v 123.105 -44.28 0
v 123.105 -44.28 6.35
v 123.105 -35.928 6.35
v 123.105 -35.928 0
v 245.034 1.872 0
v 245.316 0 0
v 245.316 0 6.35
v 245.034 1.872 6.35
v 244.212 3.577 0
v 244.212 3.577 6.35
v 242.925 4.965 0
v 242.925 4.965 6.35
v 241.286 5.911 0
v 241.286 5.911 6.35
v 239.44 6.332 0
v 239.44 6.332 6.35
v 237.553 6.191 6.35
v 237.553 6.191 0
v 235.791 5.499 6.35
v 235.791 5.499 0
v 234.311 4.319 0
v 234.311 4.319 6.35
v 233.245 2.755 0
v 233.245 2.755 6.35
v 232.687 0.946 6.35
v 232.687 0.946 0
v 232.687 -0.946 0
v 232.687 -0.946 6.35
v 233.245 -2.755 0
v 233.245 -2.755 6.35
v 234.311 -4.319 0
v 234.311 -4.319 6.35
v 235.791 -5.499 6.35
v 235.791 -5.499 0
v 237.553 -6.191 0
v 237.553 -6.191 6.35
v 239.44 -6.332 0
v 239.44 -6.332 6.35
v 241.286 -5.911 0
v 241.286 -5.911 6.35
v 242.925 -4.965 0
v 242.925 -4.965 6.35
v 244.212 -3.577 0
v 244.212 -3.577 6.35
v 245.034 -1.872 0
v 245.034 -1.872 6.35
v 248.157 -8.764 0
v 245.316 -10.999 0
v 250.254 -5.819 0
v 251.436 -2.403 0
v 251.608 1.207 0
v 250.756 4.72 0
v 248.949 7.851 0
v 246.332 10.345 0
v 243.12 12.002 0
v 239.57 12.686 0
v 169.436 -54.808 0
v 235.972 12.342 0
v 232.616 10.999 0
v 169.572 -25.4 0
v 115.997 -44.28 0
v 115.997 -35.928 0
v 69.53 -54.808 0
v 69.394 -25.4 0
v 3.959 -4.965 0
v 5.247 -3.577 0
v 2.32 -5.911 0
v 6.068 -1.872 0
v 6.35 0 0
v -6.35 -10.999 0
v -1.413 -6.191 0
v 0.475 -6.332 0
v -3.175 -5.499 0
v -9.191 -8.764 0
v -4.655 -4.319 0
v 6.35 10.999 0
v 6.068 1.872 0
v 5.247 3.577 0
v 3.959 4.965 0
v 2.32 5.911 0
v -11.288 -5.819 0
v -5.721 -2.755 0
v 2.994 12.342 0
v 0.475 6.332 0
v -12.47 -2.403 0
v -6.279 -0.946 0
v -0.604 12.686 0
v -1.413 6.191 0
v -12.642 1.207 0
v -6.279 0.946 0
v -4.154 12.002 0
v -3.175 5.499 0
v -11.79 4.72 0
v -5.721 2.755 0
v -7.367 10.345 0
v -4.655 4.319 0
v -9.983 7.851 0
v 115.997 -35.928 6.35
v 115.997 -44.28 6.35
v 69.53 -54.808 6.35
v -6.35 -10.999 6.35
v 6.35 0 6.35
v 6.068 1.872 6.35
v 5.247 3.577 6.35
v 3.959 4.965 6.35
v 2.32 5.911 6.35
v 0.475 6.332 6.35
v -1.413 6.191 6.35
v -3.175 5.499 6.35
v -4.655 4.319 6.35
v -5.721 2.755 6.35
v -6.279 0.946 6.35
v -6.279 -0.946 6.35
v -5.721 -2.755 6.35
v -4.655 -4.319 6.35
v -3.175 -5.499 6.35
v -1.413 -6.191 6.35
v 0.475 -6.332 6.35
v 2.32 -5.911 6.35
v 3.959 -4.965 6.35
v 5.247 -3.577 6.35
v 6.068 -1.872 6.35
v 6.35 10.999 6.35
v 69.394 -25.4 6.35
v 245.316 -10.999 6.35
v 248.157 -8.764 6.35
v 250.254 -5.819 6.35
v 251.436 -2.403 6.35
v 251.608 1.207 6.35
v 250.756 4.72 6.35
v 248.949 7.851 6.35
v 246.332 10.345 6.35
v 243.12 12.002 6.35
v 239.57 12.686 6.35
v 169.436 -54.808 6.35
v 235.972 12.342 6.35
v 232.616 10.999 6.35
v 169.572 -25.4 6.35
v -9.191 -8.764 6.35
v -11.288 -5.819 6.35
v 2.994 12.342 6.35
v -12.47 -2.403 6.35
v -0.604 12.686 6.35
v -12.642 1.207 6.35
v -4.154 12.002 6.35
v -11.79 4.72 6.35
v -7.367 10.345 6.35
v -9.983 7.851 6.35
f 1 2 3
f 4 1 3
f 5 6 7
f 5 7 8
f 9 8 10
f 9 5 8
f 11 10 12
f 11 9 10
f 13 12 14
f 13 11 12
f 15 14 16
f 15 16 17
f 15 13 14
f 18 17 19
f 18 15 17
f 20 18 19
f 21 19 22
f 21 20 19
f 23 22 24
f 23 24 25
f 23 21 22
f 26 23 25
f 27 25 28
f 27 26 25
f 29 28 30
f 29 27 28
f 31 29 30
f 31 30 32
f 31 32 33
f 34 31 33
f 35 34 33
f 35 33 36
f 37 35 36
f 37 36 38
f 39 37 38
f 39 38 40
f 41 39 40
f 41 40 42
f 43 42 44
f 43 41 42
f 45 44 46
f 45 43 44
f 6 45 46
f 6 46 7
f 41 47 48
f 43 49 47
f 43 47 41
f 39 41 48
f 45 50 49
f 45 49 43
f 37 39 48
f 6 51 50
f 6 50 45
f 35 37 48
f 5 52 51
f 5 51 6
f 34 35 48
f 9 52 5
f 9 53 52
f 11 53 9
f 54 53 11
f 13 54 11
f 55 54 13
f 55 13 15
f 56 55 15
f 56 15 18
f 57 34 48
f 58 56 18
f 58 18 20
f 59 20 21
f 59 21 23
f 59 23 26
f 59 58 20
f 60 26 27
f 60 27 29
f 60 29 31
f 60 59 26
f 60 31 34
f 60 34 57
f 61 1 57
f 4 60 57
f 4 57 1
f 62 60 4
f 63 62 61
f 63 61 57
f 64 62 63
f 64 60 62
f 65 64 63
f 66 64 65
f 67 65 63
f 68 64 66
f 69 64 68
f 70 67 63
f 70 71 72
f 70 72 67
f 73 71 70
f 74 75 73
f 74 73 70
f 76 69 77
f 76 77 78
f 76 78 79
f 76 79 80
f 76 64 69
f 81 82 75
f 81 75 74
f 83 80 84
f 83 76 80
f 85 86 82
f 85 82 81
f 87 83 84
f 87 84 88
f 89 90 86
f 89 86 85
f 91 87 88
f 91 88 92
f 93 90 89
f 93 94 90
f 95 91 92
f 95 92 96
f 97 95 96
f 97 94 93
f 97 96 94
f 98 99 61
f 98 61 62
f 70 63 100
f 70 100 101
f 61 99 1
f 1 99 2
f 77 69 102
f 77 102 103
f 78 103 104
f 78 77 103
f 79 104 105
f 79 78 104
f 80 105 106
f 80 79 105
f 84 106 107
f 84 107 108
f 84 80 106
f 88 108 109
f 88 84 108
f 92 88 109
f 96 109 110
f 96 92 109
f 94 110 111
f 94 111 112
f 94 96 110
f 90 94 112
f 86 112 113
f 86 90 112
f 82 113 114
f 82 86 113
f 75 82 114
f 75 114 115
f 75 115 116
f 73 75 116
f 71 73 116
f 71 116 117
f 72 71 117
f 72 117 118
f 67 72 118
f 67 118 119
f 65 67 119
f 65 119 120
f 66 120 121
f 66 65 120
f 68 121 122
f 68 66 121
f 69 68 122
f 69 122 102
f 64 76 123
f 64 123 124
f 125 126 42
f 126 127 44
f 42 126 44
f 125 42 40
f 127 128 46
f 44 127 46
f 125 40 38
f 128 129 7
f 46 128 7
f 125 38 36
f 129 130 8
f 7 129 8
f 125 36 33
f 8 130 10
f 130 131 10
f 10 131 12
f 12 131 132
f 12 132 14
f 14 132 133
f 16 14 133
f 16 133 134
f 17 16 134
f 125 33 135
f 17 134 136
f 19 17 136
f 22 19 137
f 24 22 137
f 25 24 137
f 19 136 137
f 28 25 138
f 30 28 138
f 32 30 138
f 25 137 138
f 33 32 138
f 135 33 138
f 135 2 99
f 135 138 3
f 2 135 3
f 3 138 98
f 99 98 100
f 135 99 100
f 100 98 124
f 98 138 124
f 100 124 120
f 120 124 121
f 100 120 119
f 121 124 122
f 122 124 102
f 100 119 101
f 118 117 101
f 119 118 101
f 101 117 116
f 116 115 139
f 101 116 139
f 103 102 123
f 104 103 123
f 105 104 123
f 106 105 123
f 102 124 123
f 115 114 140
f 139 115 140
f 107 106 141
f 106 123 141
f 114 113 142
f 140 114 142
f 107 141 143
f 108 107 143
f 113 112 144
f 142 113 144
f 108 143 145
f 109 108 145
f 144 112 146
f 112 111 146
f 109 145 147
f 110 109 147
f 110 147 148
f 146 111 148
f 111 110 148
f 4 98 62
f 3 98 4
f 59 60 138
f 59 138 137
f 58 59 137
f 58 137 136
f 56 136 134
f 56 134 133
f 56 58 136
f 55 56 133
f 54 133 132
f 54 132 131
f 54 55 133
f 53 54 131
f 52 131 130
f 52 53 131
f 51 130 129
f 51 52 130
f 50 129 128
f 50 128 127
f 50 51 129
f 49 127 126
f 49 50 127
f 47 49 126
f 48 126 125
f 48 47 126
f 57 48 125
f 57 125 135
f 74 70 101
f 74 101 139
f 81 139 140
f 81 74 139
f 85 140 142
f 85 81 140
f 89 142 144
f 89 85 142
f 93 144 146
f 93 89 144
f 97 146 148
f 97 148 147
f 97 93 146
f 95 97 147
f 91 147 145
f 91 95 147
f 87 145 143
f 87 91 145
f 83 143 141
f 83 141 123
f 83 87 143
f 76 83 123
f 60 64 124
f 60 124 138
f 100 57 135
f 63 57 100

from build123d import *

# Parameters (mm, degrees)
SKETCH1_R           = 6.35
BOSS_EXTRUDE1_DEPTH = 6.35
CUT_EXTRUDE1_REACH  = 259.643
SKETCH2_W           = 7.108529786
SKETCH2_H           = 8.352611846


with BuildPart() as part:
    # Sketch1 → Boss-Extrude1 (new body)
    with BuildSketch(Plane.XY):
        with BuildLine():
            Line((6.35, 10.998522628), (69.394090512, -25.4))
            Line((69.394090512, -25.4), (169.571649488, -25.4))
            Line((169.571649488, -25.4), (232.61574, 10.998522628))
            ThreePointArc((232.61574, 10.998522628), (249.964262628, 6.35), (245.31574, -10.998522628))
            Line((245.31574, -10.998522628), (169.435593158, -54.807945834))
            Line((169.435593158, -54.807945834), (69.530146842, -54.807945834))
            Line((69.530146842, -54.807945834), (-6.35, -10.998522628))
            ThreePointArc((-6.35, -10.998522628), (-10.998522628, 6.35), (6.35, 10.998522628))
        make_face()
        Circle(SKETCH1_R, mode=Mode.SUBTRACT)
        with Locations((238.96574, 0)):
            Circle(SKETCH1_R, mode=Mode.SUBTRACT)
    extrude(amount=BOSS_EXTRUDE1_DEPTH)

    # Sketch2 → Cut-Extrude1 (cut, up to next)
    with BuildSketch(Plane.XY.offset(6.35), mode=Mode.PRIVATE) as cut_extrude1_sk1:
        with Locations((119.550898165, -40.103972917)):
            Rectangle(SKETCH2_W, SKETCH2_H)
    cut_extrude1_tool1 = extrude(cut_extrude1_sk1.sketch, amount=-CUT_EXTRUDE1_REACH, mode=Mode.PRIVATE) & part.part
    add(cut_extrude1_tool1.solids().sort_by_distance((119.550898, -40.103973, 6.35))[0], mode=Mode.SUBTRACT)


solid = part.part
